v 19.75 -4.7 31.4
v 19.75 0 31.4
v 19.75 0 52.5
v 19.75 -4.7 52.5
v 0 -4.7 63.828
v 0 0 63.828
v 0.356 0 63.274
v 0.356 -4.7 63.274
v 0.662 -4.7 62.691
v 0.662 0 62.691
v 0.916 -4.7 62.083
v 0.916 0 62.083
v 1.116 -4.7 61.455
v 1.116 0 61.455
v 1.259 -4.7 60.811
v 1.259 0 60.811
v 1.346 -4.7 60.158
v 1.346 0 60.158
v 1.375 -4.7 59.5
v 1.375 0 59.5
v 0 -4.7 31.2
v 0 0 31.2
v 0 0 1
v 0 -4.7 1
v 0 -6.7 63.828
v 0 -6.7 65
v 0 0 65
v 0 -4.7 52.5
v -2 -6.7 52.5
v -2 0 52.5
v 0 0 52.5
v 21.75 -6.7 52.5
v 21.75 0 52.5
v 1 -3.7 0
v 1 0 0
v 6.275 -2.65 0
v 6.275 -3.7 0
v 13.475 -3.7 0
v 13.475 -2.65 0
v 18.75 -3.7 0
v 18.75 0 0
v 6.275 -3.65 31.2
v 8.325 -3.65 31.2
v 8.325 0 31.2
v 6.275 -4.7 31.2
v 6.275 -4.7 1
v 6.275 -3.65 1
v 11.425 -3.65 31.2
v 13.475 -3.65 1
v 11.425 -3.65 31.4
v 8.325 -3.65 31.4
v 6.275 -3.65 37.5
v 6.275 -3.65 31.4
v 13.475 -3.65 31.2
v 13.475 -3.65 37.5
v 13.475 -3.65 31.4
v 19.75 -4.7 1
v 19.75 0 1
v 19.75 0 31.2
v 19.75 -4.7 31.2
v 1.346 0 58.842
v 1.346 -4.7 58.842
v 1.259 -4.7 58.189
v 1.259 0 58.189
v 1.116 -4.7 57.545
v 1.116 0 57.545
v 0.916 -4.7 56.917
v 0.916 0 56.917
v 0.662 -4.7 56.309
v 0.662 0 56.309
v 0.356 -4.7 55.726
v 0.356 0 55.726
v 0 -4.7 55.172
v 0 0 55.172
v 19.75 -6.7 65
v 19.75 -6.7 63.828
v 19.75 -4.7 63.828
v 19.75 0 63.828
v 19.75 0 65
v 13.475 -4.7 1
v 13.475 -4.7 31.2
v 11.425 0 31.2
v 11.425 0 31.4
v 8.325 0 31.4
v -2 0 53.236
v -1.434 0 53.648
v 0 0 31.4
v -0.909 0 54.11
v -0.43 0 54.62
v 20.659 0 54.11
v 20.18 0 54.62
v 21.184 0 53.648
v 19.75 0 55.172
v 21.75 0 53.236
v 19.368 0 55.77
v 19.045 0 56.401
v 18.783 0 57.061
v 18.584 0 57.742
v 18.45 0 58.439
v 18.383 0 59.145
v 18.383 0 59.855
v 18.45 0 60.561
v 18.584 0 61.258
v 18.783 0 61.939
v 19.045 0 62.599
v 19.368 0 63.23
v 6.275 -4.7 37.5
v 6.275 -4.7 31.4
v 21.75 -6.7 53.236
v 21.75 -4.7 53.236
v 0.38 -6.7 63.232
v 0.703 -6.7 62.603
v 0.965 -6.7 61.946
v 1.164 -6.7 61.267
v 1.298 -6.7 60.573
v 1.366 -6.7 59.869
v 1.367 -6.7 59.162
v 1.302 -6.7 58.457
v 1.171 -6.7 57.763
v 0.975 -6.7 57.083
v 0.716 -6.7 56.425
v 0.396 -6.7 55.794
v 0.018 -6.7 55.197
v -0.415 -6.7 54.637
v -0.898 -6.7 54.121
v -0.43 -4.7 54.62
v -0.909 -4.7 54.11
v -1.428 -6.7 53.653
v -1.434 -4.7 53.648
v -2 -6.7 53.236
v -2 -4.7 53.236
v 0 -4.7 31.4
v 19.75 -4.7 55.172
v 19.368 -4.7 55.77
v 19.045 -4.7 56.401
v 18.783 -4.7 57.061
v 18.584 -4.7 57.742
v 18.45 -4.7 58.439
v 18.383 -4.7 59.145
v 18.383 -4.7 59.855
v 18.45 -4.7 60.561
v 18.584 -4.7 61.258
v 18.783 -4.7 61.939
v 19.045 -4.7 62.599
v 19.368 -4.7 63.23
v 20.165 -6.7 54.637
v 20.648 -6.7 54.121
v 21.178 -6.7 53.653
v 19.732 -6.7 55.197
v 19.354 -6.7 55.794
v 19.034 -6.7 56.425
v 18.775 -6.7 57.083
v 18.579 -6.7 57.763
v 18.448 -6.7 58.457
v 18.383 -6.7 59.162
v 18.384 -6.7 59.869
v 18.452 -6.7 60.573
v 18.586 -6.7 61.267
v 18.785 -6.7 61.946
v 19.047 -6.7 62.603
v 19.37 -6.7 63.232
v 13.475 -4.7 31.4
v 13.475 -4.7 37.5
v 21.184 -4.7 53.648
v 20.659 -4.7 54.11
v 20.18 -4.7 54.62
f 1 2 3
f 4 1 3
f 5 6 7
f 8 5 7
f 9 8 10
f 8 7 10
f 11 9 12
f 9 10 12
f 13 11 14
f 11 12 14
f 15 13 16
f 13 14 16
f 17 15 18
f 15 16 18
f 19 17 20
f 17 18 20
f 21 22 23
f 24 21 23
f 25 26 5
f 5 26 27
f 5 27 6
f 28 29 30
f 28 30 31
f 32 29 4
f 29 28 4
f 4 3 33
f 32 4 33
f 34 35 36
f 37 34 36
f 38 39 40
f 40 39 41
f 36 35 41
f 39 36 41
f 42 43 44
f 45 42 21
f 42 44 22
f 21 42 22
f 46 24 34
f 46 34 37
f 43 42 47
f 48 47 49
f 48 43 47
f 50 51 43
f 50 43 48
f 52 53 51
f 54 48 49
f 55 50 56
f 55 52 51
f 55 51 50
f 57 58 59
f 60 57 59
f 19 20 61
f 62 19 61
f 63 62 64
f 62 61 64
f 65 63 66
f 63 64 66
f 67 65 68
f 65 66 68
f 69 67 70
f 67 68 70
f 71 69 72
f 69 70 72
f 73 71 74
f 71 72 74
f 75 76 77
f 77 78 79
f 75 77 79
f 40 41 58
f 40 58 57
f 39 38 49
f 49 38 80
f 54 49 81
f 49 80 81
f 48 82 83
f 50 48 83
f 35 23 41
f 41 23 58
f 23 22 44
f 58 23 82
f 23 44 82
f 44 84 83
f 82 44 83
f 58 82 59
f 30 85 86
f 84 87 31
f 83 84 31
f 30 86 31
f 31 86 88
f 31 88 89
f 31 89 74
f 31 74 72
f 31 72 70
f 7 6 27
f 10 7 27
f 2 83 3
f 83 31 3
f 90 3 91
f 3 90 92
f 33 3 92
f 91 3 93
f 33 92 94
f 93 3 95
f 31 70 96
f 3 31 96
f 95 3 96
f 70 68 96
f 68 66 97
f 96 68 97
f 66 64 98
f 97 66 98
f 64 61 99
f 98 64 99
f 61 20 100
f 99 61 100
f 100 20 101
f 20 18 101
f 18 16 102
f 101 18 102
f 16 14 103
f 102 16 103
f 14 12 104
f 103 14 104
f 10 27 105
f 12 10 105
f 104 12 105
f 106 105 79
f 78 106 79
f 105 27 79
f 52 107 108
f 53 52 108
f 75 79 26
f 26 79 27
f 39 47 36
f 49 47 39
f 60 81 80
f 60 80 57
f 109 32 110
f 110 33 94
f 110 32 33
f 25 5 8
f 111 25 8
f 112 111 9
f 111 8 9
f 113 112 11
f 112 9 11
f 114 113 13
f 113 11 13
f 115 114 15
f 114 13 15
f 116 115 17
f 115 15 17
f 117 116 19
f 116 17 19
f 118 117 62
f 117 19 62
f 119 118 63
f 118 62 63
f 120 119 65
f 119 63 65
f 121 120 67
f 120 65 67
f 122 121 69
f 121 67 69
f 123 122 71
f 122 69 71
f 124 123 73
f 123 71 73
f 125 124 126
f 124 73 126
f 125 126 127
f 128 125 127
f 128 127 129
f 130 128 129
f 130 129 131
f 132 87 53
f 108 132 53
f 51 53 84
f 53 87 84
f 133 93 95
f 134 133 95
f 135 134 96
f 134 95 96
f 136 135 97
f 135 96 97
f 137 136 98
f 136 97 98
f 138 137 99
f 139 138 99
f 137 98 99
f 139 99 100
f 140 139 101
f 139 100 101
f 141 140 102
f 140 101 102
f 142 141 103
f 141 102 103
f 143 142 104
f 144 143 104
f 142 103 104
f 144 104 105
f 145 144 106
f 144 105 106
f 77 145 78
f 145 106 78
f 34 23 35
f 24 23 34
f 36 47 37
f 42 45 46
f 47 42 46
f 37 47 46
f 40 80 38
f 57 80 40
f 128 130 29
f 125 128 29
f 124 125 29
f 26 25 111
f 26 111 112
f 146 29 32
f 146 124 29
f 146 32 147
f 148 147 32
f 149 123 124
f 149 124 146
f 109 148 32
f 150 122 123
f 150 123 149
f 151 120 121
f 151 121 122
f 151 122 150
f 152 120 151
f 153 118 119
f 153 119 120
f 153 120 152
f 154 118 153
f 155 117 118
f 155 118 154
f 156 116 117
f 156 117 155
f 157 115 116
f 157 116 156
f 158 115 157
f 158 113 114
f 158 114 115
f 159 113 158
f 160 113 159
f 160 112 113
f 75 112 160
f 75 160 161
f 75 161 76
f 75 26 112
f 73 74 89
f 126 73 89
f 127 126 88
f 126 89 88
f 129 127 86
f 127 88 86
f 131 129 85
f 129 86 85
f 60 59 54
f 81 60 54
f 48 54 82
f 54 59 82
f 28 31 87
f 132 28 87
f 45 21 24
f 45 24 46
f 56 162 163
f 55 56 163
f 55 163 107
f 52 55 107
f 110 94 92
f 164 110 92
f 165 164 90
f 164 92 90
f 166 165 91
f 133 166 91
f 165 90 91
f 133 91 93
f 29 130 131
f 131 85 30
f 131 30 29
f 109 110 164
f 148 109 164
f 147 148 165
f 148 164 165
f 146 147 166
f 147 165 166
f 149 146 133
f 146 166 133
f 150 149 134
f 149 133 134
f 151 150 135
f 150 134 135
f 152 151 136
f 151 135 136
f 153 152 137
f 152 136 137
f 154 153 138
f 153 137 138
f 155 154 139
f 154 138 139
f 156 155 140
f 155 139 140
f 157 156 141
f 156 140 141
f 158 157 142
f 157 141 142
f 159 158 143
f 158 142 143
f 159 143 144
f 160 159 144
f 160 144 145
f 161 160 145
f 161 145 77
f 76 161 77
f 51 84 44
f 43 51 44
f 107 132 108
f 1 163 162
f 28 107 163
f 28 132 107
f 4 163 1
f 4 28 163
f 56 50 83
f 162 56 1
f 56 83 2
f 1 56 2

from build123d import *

# Parameters (mm, degrees)
F1_DEPTH = 4.7
F3_DEPTH = 1.05
F6_DEPTH = 2
F7_SIZE  = 1


with BuildPart() as f1:
    # F0 (on Front) → F1 (new body)
    with BuildSketch(Plane.XZ):
        with BuildLine():
            Line((0, 31.2), (0, 0))
            Line((0, 0), (19.75, 0))
            Line((19.75, 0), (19.75, 31.2))
            Line((19.75, 31.2), (11.425, 31.2))
            Line((11.425, 31.2), (11.425, 31.4))
            Line((11.425, 31.4), (19.75, 31.4))
            Line((19.75, 31.4), (19.75, 52.5))
            Line((19.75, 52.5), (19.75, 55.1716775767))
            ThreePointArc((19.75, 55.1716775767), (18.375, 59.5), (19.75, 63.8283224233))
            Line((19.75, 63.8283224233), (19.75, 65))
            Line((19.75, 65), (0, 65))
            Line((0, 65), (0, 63.8283224233))
            ThreePointArc((0, 63.8283224233), (1.0229892277, 61.7707377656), (1.375, 59.5))
            ThreePointArc((1.375, 59.5), (1.0229892277, 57.2292622344), (0, 55.1716775767))
            Line((0, 55.1716775767), (0, 52.5))
            Line((0, 52.5), (0, 31.4))
            Line((0, 31.4), (8.325, 31.4))
            Line((8.325, 31.4), (8.325, 31.2))
            Line((8.325, 31.2), (0, 31.2))
        make_face()
        with BuildLine():
            Line((-2, 52.5), (0, 52.5))
            Line((0, 52.5), (0, 55.1716775767))
            ThreePointArc((0, 55.1716775767), (-0.9094386331, 54.1103878035), (-2, 53.2362650918))
            Line((-2, 53.2362650918), (-2, 52.5))
        make_face()
        with BuildLine():
            Line((19.75, 55.1716775767), (19.75, 52.5))
            Line((19.75, 52.5), (21.75, 52.5))
            Line((21.75, 52.5), (21.75, 53.2362650918))
            ThreePointArc((21.75, 53.2362650918), (20.6594386331, 54.1103878035), (19.75, 55.1716775767))
        make_face()
    extrude(amount=F1_DEPTH)

    # F2 (on face) → F3 (cut)
    with BuildSketch(Plane.XZ.offset(4.7)):
        Polygon((13.475, 37.5), (6.275, 37.5), (6.275, 2.2), (6.275, 0), (13.475, 0), (13.475, 2.2), align=None)
    extrude(amount=-F3_DEPTH, mode=Mode.SUBTRACT)

    # F5 (on face) → F6 (join)
    with BuildSketch(Plane.XZ.offset(4.7)):
        with BuildLine():
            Line((-2, 52.5), (0, 52.5))
            Line((0, 52.5), (19.75, 52.5))
            Line((19.75, 52.5), (21.75, 52.5))
            Line((21.75, 52.5), (21.75, 53.2362650918))
            ThreePointArc((21.75, 53.2362650918), (18.5052276407, 58.1084342015), (19.75, 63.8283224233))
            Line((19.75, 63.8283224233), (19.75, 65))
            Line((19.75, 65), (0, 65))
            Line((0, 65), (0, 63.8283224233))
            ThreePointArc((0, 63.8283224233), (1.2447723593, 58.1084342015), (-2, 53.2362650918))
            Line((-2, 53.2362650918), (-2, 52.5))
        make_face()
    extrude(amount=F6_DEPTH)

    # F7
    f7_edges = [f1.edges().sort_by_distance(p)[0] for p in [
        (0, -2.35, 0),
        (19.75, -2.35, 0),
        (3.1375, -4.7, 0),
        (16.6125, -4.7, 0),
        (9.875, -3.65, 0),
    ]]
    chamfer(f7_edges, length=F7_SIZE)


solid = f1.part
